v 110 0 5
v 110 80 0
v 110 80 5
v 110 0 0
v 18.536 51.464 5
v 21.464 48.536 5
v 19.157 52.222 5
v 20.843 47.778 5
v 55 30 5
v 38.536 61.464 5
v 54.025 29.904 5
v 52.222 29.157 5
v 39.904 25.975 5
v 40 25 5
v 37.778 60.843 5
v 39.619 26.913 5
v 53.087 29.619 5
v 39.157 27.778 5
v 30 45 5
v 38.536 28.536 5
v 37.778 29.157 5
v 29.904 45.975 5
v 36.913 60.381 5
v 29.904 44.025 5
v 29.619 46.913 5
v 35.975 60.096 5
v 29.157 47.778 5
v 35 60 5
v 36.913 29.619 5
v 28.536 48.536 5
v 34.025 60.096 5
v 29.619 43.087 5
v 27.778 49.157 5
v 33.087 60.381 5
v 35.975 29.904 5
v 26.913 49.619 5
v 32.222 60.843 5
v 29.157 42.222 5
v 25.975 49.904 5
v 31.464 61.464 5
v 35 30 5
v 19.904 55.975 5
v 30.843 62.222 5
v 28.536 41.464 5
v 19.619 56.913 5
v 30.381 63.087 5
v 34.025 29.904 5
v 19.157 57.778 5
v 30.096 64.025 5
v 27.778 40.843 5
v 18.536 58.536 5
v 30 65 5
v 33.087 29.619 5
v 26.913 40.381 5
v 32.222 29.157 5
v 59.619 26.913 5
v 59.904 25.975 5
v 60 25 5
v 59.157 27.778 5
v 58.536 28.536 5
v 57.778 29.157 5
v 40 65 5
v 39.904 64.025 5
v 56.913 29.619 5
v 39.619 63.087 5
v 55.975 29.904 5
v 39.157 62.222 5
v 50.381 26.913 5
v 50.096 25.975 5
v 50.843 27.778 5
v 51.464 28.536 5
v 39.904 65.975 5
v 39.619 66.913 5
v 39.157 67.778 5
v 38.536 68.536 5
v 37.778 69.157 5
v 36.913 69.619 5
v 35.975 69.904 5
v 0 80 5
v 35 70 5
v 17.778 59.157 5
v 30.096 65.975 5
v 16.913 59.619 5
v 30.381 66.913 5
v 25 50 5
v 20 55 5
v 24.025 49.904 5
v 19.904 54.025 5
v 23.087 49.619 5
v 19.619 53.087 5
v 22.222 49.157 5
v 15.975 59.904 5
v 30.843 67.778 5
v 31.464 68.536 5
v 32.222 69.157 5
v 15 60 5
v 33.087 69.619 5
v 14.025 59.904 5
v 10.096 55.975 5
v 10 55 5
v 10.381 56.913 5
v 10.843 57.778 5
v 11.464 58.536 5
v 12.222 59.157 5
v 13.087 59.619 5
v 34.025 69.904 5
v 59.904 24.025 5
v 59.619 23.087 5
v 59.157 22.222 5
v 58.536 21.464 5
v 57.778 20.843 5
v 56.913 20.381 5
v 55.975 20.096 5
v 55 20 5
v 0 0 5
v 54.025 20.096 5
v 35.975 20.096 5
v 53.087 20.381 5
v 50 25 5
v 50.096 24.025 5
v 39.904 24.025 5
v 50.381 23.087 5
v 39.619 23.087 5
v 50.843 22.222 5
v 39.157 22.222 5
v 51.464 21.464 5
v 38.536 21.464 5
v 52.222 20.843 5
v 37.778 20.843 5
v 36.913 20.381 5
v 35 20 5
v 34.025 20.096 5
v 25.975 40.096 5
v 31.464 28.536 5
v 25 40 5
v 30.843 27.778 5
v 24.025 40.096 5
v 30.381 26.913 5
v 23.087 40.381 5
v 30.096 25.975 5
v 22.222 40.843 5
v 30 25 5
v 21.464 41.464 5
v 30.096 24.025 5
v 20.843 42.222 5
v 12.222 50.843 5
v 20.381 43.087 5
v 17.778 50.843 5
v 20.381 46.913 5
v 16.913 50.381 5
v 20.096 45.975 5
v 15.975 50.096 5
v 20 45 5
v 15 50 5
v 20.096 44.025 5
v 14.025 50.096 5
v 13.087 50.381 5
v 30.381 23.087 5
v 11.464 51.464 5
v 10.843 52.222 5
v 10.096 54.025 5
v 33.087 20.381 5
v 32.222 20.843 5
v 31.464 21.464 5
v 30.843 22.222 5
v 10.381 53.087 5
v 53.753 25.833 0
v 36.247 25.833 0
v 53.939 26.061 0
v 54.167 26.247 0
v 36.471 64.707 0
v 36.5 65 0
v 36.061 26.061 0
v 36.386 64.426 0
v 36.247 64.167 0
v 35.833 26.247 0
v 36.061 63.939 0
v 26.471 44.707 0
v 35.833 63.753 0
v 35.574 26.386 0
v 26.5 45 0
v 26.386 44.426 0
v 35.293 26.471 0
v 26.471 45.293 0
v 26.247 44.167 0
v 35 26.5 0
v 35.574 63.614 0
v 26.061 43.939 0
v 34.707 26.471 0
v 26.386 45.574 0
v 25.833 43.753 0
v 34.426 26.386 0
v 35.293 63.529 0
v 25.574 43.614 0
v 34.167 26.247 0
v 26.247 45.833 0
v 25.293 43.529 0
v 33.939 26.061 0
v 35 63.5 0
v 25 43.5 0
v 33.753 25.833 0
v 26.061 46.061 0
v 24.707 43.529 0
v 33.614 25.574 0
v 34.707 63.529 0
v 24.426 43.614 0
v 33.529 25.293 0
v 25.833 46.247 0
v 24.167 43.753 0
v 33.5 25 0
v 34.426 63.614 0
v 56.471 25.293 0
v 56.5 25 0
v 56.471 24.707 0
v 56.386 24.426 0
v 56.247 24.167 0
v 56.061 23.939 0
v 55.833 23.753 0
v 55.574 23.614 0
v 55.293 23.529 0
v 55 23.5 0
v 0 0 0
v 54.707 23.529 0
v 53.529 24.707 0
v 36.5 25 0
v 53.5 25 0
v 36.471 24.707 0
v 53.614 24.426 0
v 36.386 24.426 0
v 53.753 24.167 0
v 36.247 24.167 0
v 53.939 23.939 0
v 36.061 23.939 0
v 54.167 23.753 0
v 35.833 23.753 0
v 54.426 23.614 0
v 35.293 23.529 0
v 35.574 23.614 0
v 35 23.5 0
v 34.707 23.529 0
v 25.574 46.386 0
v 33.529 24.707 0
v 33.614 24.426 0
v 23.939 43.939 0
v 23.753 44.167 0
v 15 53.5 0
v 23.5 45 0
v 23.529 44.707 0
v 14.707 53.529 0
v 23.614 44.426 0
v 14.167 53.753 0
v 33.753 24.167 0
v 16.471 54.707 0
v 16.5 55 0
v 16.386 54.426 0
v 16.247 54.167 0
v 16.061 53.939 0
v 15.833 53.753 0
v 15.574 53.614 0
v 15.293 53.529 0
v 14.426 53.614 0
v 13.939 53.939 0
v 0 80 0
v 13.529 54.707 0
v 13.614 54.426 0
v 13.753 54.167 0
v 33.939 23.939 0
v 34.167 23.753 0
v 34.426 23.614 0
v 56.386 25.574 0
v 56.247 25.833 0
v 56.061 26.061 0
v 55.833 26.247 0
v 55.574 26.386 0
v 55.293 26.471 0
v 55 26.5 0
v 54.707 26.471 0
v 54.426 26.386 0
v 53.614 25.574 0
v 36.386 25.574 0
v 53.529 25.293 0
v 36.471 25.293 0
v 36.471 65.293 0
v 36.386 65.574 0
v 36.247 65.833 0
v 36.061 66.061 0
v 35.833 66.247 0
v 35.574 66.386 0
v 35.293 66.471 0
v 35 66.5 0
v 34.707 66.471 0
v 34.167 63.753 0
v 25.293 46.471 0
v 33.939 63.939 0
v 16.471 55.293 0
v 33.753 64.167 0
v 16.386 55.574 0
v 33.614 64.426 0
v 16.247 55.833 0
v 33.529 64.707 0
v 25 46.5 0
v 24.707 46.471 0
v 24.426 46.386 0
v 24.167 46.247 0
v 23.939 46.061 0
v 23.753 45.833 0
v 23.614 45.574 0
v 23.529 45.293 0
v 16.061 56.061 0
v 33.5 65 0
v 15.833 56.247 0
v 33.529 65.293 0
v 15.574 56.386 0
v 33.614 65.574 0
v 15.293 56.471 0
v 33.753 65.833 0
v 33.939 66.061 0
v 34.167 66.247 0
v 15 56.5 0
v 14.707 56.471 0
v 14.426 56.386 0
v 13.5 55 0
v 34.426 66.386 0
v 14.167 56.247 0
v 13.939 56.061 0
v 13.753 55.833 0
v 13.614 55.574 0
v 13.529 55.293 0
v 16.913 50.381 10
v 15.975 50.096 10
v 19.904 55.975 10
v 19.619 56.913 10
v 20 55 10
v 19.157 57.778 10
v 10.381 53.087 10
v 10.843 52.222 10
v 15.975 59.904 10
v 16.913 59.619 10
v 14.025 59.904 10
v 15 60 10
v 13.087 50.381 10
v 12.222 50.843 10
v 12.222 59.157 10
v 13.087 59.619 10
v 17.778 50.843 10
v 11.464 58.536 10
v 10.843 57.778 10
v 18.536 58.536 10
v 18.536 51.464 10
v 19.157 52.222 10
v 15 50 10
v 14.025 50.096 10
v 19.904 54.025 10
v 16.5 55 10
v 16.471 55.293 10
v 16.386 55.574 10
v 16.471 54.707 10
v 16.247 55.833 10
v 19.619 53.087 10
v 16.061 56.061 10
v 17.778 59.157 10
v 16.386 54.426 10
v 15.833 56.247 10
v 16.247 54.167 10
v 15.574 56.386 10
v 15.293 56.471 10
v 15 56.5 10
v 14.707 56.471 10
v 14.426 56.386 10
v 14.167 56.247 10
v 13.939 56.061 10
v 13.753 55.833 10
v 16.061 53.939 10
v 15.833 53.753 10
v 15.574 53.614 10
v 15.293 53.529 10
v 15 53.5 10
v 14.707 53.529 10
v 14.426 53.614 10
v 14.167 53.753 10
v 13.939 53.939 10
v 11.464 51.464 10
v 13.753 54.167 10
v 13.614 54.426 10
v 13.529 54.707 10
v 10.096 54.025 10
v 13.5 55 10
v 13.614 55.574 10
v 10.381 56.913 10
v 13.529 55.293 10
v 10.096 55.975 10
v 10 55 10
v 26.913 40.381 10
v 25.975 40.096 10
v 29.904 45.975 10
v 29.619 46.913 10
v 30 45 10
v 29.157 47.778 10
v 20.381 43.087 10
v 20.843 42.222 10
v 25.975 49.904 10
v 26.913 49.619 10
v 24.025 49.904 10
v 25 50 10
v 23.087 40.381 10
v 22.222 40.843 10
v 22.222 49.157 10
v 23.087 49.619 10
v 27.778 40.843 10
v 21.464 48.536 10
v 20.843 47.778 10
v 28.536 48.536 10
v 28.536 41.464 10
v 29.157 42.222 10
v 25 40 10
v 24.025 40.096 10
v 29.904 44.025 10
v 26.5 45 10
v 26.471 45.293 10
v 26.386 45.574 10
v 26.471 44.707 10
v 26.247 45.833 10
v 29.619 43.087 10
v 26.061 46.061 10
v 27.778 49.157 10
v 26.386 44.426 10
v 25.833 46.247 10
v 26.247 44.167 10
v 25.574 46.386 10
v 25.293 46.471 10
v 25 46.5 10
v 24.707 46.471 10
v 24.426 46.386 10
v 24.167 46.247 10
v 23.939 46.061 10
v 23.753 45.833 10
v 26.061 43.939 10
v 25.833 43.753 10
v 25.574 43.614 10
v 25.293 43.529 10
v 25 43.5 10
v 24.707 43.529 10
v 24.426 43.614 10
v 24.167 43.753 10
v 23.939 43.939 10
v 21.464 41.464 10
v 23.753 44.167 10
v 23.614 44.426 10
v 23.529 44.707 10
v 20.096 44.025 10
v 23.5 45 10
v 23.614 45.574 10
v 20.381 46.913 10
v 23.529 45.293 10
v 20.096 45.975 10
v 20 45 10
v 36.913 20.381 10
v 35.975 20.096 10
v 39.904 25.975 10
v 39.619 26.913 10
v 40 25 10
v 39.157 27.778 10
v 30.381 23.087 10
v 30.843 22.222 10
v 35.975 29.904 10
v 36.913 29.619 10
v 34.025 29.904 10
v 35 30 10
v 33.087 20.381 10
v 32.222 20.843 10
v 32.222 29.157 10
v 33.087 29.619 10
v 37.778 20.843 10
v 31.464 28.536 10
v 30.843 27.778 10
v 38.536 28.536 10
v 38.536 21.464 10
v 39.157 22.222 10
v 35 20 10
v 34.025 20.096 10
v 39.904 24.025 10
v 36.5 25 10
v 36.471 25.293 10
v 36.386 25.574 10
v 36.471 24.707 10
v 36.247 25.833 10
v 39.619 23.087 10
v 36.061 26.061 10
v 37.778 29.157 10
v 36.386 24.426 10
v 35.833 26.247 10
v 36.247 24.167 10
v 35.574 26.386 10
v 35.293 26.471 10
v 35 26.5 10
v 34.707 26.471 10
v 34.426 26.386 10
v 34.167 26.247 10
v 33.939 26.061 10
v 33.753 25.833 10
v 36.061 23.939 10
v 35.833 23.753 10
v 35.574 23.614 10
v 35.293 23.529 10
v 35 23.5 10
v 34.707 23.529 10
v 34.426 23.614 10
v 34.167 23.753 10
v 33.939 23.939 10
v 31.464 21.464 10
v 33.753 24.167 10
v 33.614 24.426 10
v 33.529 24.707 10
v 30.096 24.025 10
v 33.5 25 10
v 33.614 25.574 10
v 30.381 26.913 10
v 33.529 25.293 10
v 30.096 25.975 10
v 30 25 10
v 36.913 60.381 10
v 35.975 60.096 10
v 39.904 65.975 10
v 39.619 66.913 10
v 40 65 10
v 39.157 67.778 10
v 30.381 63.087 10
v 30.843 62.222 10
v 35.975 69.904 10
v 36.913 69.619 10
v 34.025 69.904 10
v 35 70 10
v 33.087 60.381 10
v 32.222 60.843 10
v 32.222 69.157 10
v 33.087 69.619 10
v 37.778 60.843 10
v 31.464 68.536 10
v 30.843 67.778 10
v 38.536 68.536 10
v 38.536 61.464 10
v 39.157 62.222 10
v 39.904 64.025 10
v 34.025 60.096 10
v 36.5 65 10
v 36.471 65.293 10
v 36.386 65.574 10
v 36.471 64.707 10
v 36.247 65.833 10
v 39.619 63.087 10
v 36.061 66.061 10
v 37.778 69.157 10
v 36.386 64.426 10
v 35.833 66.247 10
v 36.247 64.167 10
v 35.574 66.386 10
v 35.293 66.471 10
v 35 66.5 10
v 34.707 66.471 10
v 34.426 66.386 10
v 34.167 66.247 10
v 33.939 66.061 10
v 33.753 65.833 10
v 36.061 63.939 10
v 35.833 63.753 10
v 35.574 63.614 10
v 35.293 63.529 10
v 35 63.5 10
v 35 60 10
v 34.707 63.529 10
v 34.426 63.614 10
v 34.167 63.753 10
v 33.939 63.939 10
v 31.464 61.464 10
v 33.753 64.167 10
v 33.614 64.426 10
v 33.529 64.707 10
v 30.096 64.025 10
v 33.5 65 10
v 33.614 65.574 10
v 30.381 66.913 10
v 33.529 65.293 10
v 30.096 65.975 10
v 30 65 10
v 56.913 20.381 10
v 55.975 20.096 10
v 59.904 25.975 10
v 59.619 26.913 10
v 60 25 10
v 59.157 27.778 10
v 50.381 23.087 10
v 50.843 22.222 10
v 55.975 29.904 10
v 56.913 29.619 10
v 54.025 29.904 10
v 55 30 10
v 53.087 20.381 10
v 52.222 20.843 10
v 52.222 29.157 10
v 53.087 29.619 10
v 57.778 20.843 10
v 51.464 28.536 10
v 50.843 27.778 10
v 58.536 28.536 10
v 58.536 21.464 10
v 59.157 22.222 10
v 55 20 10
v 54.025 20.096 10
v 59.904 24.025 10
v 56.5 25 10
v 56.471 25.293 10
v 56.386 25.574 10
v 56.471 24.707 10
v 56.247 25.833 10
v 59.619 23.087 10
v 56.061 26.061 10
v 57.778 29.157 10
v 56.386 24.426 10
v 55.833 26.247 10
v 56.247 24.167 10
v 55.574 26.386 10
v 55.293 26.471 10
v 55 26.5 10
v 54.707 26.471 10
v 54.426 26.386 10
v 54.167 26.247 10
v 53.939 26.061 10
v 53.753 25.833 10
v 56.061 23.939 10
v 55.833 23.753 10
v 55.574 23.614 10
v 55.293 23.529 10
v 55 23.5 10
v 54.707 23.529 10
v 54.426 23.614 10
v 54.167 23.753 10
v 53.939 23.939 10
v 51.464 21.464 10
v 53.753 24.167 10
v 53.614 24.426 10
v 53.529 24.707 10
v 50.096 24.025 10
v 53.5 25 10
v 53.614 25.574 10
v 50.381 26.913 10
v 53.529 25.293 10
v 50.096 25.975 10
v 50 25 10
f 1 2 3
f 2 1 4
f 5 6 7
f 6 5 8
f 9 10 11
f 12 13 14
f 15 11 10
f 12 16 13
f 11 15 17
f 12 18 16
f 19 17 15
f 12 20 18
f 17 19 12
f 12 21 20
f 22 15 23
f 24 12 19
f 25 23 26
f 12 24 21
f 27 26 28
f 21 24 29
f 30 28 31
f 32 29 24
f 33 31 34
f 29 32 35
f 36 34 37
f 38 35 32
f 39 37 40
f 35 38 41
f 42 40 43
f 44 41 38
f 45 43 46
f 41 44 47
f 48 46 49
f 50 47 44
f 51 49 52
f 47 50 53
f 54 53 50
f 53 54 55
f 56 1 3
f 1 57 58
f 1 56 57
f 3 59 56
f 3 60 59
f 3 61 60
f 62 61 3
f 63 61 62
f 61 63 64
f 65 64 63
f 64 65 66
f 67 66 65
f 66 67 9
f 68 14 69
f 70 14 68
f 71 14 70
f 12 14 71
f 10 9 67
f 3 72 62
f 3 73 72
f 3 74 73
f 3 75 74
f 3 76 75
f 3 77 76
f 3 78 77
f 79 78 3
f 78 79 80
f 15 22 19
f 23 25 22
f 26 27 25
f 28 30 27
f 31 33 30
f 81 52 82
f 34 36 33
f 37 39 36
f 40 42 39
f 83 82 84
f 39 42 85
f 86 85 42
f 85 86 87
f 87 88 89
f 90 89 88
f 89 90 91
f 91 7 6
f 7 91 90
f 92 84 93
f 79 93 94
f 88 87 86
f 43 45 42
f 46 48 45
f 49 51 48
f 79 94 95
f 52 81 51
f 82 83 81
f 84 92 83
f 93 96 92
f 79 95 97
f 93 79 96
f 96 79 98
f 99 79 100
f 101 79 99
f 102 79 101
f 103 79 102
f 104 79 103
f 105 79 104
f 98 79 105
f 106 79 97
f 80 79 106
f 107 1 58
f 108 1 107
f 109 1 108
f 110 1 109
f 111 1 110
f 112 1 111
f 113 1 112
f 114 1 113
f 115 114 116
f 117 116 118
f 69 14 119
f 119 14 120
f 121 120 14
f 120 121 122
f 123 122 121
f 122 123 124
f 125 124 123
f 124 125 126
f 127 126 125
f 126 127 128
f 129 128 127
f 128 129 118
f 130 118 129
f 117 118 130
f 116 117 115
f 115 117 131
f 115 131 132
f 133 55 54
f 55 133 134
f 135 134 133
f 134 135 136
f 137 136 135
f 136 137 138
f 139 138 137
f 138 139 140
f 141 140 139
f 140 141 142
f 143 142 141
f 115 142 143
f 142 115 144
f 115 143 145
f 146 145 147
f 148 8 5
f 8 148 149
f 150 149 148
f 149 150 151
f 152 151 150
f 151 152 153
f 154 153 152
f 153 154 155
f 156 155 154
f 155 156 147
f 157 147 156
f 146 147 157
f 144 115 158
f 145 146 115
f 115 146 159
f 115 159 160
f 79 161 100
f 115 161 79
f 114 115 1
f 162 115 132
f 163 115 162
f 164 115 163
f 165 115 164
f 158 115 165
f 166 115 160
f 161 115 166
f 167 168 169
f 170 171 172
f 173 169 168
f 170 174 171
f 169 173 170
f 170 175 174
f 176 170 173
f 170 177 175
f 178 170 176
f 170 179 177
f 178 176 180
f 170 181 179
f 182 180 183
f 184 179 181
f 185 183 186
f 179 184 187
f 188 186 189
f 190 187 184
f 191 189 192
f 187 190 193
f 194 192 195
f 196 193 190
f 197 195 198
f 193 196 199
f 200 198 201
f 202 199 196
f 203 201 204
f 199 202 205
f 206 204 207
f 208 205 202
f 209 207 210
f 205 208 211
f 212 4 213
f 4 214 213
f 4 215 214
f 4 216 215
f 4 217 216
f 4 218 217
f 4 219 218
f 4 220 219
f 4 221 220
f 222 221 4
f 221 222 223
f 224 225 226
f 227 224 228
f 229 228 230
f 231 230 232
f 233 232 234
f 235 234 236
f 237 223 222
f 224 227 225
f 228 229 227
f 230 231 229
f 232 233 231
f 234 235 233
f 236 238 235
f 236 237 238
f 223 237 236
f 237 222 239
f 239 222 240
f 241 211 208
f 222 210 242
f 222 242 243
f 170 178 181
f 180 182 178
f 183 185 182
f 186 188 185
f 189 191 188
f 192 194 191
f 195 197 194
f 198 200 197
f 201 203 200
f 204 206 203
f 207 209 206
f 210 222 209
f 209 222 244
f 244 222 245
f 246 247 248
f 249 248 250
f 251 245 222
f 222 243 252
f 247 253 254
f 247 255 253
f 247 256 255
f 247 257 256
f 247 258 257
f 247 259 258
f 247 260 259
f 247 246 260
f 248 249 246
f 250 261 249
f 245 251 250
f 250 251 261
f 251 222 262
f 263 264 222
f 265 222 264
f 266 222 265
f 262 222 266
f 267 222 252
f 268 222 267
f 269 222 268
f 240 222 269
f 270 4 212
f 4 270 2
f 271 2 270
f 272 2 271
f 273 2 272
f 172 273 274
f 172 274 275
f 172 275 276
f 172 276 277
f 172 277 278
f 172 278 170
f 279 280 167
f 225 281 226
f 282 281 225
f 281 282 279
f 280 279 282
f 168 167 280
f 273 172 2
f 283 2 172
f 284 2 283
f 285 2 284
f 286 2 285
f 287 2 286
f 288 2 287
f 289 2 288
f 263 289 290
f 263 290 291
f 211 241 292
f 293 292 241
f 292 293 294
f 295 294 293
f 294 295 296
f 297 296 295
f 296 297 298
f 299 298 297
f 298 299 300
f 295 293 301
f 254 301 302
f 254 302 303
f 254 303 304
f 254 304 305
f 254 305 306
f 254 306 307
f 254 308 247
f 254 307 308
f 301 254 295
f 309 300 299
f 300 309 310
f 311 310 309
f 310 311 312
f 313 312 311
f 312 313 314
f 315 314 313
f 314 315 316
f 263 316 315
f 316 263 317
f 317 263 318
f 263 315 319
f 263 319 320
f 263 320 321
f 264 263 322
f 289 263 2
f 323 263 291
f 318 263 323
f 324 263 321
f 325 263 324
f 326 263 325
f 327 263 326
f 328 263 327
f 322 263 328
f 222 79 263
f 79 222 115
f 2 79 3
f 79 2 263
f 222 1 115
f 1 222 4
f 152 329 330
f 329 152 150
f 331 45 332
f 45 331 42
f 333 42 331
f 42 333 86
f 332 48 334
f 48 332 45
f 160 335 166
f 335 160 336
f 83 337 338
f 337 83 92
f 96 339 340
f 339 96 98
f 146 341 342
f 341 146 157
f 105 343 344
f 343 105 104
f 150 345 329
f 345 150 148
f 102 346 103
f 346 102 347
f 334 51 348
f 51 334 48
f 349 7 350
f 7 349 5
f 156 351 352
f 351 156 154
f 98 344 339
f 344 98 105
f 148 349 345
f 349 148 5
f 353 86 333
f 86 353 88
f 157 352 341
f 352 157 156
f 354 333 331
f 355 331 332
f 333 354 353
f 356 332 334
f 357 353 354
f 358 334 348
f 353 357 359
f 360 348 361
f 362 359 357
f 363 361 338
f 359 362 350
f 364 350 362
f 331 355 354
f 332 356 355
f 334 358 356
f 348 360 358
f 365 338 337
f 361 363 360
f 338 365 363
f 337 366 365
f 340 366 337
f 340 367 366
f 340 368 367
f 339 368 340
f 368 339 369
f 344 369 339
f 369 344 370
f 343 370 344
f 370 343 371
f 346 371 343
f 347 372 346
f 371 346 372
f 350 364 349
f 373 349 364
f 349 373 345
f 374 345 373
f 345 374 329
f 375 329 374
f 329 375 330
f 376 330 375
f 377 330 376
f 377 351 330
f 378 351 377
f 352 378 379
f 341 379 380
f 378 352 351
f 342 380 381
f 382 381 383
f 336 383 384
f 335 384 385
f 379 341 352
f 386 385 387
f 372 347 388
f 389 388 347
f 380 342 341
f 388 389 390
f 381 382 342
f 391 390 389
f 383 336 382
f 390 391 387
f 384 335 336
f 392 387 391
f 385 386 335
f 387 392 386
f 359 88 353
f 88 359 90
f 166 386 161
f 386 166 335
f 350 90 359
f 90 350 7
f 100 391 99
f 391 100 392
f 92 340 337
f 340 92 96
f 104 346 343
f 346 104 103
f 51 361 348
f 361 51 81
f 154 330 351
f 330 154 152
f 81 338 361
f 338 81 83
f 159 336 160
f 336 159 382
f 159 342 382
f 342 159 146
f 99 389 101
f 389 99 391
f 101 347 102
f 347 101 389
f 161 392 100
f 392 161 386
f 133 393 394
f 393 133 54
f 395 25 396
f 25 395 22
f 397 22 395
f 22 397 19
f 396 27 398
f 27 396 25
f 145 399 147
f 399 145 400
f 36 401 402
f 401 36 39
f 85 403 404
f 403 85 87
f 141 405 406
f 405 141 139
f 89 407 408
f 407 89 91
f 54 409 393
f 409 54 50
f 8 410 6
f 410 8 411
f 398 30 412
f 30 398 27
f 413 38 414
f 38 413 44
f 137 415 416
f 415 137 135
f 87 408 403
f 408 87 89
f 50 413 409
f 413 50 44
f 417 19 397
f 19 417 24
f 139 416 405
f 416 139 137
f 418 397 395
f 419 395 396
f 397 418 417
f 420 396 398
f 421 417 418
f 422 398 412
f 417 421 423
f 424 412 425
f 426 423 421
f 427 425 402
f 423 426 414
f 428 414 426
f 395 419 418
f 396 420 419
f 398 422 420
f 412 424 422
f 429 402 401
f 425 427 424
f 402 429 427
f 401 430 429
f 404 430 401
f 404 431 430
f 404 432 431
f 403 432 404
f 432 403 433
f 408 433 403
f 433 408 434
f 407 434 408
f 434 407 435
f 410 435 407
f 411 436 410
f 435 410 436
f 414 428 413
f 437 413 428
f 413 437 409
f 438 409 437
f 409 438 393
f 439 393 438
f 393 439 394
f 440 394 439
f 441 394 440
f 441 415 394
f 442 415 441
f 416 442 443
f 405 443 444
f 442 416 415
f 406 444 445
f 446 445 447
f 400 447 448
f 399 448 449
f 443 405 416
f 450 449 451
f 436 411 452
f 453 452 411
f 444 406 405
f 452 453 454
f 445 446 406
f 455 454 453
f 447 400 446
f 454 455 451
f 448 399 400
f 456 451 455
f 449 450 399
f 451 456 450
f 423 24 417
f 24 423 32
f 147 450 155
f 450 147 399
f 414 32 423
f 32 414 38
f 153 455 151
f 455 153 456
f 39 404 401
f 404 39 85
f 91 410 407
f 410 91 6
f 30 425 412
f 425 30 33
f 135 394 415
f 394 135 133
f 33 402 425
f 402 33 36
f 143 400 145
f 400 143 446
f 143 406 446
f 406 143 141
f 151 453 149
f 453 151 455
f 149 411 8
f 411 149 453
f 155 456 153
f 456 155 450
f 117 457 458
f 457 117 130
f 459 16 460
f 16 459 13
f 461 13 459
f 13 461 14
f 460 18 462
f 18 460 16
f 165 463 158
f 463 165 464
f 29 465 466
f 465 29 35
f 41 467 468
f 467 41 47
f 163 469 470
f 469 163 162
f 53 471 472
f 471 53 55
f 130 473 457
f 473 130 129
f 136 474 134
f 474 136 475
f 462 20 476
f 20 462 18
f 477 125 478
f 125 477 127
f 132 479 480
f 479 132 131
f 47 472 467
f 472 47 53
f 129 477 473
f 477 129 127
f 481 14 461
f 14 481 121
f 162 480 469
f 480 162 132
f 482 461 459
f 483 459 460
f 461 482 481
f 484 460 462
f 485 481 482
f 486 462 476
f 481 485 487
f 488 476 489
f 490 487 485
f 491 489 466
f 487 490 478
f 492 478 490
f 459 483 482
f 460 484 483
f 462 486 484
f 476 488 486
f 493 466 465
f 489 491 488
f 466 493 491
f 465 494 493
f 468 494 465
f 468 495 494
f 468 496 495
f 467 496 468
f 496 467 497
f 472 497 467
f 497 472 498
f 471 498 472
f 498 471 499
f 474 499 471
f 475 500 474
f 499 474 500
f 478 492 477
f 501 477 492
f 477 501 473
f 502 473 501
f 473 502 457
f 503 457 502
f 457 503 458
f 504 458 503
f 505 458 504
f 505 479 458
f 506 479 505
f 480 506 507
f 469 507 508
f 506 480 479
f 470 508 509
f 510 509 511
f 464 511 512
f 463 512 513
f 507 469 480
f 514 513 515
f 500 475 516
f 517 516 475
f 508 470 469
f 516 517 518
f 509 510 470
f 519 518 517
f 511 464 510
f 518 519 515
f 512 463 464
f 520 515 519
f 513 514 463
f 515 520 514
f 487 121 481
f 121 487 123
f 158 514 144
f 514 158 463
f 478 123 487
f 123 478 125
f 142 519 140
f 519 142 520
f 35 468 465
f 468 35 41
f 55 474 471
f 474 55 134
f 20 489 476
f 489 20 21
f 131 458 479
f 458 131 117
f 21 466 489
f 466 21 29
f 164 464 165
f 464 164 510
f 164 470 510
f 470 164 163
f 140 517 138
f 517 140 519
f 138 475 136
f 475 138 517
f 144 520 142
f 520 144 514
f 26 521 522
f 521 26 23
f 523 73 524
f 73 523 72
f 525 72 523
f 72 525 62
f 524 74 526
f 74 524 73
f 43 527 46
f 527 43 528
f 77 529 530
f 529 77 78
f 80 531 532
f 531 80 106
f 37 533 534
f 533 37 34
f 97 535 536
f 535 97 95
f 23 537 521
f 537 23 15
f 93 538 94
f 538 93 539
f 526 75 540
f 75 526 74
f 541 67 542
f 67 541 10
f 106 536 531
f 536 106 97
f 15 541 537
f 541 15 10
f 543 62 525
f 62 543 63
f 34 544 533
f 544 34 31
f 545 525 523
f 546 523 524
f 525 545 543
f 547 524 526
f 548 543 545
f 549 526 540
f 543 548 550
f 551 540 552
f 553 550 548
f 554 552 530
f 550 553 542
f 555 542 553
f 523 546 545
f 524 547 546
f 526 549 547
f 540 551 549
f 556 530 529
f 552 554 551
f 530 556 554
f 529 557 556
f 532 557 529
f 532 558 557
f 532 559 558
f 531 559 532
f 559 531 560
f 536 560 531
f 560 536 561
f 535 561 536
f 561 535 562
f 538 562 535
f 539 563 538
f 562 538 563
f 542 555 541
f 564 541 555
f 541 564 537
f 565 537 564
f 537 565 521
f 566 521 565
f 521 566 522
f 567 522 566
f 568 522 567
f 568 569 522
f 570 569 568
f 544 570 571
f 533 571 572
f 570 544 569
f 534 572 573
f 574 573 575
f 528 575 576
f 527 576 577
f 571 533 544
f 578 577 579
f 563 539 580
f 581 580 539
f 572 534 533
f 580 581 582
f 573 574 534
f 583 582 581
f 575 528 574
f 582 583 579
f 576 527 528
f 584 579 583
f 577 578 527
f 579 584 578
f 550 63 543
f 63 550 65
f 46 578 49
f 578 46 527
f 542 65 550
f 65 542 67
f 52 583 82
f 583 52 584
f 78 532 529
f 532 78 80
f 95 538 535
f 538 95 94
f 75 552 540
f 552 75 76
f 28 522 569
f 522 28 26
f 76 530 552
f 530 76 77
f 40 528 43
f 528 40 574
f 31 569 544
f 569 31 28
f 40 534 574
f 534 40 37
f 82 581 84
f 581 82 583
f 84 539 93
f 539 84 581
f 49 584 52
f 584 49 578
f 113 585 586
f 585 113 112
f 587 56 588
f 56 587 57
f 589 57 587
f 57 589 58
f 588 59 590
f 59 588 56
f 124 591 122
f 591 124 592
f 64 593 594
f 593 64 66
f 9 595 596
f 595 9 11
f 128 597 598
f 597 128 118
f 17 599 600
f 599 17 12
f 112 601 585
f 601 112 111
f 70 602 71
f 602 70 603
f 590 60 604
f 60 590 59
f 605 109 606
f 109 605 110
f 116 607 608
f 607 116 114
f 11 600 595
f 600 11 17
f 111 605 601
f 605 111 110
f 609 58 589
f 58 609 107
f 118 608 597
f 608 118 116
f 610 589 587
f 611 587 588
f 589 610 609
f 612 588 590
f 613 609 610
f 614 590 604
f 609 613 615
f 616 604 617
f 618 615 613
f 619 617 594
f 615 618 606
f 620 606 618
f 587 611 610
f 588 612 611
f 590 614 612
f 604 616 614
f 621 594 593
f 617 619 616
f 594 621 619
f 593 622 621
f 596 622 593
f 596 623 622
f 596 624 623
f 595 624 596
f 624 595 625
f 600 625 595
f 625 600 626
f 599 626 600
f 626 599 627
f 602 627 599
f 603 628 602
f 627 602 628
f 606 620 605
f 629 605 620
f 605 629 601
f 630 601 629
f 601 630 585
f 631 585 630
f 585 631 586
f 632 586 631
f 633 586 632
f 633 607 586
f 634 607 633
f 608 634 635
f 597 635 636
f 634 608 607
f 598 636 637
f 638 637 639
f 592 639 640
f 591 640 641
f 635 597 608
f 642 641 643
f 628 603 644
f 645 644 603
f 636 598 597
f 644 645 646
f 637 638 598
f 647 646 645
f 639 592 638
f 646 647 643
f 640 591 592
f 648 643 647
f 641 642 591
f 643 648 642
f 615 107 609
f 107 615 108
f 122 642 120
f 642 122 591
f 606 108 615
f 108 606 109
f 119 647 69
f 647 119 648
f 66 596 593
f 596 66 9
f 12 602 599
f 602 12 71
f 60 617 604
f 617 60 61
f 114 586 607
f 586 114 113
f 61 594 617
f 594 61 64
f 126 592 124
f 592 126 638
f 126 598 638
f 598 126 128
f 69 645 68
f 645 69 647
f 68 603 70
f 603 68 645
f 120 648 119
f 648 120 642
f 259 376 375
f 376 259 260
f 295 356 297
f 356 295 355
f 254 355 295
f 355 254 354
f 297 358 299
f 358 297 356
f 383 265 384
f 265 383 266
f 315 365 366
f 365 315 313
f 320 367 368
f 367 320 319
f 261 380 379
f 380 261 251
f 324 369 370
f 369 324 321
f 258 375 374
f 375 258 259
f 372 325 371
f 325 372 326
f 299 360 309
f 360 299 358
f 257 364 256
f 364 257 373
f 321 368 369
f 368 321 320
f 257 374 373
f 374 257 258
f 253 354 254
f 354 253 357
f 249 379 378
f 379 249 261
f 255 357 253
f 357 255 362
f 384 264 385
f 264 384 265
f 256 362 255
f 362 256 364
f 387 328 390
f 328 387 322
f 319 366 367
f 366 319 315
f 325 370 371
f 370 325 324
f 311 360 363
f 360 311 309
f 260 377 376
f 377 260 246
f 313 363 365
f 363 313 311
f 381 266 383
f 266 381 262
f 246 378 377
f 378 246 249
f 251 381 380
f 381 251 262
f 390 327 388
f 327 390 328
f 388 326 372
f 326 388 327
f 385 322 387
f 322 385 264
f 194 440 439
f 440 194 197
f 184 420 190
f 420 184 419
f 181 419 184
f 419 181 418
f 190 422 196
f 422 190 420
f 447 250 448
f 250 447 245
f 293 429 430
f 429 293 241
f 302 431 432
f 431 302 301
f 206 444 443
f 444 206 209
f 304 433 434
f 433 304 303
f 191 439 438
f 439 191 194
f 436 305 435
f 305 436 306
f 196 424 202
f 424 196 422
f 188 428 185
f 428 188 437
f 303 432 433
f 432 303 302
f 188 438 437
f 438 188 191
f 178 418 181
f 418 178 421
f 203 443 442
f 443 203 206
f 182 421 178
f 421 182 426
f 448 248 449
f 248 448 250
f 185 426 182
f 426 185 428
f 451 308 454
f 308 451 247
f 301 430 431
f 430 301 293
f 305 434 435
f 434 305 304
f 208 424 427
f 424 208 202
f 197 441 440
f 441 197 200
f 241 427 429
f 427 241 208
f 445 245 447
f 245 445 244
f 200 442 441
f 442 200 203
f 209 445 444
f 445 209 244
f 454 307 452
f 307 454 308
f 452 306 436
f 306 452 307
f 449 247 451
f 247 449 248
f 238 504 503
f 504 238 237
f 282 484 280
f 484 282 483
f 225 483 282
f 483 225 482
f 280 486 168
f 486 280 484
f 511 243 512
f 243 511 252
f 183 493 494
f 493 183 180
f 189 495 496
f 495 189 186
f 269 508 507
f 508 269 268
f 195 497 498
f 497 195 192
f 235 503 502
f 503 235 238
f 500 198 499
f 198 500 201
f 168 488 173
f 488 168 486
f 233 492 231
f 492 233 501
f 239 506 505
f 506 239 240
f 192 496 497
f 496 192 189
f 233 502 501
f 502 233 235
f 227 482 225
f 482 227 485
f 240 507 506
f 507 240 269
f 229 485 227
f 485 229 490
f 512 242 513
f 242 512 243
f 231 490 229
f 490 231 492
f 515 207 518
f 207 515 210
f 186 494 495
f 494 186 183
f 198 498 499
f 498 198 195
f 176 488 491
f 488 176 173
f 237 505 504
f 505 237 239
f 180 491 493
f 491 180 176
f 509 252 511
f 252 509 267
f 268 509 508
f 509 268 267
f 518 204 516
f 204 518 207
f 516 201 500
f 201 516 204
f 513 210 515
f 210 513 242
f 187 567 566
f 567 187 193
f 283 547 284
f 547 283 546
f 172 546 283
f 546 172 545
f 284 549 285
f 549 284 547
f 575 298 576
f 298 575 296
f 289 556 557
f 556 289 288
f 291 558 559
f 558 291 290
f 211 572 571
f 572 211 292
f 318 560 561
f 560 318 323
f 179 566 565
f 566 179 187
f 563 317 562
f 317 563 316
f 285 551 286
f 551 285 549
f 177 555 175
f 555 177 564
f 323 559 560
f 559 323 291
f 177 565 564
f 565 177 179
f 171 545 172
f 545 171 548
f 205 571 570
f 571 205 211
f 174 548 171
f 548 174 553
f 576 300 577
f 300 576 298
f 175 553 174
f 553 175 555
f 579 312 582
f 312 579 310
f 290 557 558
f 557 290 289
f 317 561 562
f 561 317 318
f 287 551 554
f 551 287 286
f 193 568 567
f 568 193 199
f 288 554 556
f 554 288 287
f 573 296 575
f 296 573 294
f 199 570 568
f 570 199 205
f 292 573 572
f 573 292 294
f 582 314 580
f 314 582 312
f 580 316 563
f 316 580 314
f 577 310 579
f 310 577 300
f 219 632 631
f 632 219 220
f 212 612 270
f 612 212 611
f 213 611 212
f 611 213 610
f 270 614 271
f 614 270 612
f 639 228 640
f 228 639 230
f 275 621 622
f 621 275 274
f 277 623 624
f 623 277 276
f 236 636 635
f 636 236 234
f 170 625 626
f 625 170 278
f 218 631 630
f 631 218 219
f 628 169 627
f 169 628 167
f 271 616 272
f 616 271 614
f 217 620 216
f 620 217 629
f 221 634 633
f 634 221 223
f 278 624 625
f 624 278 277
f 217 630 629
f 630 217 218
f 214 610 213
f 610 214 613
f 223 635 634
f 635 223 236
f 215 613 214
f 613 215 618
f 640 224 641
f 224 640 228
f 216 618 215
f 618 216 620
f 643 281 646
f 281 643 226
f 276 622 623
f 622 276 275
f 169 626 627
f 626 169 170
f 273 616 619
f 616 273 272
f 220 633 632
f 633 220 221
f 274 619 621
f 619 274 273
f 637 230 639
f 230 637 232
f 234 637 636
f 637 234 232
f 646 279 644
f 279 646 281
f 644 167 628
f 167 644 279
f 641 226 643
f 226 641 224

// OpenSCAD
$fn = 32;

// ----------------------------------------------------------------------
// Boss field: plate with bosses at given coordinates
// ----------------------------------------------------------------------

// --- parameters (mm) ---
plate_l = 110;            // plate length, X
plate_w = 80;             // plate width, Y
plate_t = 5;              // plate thickness, Z
boss_d = 10;              // boss diameter
boss_h = 5;               // boss height above the plate
bore_d = 3;               // boss bore
fit_tol = 0.1;            // tolerance for press fits, mm
free_tol = 0.3;           // tolerance for clearance fits, mm

total_h = plate_t + boss_h;  // overall height

difference() {
  union() {
    cube([plate_l, plate_w, plate_t]);
    translate([15, 55, plate_t]) cylinder(h = boss_h, d = boss_d);
    translate([25, 45, plate_t]) cylinder(h = boss_h, d = boss_d);
    translate([35, 25, plate_t]) cylinder(h = boss_h, d = boss_d);
    translate([35, 65, plate_t]) cylinder(h = boss_h, d = boss_d);
    translate([55, 25, plate_t]) cylinder(h = boss_h, d = boss_d);
  }
  translate([15, 55, -1]) cylinder(h = total_h + 2, d = bore_d);
  translate([25, 45, -1]) cylinder(h = total_h + 2, d = bore_d);
  translate([35, 25, -1]) cylinder(h = total_h + 2, d = bore_d);
  translate([35, 65, -1]) cylinder(h = total_h + 2, d = bore_d);
  translate([55, 25, -1]) cylinder(h = total_h + 2, d = bore_d);
}
